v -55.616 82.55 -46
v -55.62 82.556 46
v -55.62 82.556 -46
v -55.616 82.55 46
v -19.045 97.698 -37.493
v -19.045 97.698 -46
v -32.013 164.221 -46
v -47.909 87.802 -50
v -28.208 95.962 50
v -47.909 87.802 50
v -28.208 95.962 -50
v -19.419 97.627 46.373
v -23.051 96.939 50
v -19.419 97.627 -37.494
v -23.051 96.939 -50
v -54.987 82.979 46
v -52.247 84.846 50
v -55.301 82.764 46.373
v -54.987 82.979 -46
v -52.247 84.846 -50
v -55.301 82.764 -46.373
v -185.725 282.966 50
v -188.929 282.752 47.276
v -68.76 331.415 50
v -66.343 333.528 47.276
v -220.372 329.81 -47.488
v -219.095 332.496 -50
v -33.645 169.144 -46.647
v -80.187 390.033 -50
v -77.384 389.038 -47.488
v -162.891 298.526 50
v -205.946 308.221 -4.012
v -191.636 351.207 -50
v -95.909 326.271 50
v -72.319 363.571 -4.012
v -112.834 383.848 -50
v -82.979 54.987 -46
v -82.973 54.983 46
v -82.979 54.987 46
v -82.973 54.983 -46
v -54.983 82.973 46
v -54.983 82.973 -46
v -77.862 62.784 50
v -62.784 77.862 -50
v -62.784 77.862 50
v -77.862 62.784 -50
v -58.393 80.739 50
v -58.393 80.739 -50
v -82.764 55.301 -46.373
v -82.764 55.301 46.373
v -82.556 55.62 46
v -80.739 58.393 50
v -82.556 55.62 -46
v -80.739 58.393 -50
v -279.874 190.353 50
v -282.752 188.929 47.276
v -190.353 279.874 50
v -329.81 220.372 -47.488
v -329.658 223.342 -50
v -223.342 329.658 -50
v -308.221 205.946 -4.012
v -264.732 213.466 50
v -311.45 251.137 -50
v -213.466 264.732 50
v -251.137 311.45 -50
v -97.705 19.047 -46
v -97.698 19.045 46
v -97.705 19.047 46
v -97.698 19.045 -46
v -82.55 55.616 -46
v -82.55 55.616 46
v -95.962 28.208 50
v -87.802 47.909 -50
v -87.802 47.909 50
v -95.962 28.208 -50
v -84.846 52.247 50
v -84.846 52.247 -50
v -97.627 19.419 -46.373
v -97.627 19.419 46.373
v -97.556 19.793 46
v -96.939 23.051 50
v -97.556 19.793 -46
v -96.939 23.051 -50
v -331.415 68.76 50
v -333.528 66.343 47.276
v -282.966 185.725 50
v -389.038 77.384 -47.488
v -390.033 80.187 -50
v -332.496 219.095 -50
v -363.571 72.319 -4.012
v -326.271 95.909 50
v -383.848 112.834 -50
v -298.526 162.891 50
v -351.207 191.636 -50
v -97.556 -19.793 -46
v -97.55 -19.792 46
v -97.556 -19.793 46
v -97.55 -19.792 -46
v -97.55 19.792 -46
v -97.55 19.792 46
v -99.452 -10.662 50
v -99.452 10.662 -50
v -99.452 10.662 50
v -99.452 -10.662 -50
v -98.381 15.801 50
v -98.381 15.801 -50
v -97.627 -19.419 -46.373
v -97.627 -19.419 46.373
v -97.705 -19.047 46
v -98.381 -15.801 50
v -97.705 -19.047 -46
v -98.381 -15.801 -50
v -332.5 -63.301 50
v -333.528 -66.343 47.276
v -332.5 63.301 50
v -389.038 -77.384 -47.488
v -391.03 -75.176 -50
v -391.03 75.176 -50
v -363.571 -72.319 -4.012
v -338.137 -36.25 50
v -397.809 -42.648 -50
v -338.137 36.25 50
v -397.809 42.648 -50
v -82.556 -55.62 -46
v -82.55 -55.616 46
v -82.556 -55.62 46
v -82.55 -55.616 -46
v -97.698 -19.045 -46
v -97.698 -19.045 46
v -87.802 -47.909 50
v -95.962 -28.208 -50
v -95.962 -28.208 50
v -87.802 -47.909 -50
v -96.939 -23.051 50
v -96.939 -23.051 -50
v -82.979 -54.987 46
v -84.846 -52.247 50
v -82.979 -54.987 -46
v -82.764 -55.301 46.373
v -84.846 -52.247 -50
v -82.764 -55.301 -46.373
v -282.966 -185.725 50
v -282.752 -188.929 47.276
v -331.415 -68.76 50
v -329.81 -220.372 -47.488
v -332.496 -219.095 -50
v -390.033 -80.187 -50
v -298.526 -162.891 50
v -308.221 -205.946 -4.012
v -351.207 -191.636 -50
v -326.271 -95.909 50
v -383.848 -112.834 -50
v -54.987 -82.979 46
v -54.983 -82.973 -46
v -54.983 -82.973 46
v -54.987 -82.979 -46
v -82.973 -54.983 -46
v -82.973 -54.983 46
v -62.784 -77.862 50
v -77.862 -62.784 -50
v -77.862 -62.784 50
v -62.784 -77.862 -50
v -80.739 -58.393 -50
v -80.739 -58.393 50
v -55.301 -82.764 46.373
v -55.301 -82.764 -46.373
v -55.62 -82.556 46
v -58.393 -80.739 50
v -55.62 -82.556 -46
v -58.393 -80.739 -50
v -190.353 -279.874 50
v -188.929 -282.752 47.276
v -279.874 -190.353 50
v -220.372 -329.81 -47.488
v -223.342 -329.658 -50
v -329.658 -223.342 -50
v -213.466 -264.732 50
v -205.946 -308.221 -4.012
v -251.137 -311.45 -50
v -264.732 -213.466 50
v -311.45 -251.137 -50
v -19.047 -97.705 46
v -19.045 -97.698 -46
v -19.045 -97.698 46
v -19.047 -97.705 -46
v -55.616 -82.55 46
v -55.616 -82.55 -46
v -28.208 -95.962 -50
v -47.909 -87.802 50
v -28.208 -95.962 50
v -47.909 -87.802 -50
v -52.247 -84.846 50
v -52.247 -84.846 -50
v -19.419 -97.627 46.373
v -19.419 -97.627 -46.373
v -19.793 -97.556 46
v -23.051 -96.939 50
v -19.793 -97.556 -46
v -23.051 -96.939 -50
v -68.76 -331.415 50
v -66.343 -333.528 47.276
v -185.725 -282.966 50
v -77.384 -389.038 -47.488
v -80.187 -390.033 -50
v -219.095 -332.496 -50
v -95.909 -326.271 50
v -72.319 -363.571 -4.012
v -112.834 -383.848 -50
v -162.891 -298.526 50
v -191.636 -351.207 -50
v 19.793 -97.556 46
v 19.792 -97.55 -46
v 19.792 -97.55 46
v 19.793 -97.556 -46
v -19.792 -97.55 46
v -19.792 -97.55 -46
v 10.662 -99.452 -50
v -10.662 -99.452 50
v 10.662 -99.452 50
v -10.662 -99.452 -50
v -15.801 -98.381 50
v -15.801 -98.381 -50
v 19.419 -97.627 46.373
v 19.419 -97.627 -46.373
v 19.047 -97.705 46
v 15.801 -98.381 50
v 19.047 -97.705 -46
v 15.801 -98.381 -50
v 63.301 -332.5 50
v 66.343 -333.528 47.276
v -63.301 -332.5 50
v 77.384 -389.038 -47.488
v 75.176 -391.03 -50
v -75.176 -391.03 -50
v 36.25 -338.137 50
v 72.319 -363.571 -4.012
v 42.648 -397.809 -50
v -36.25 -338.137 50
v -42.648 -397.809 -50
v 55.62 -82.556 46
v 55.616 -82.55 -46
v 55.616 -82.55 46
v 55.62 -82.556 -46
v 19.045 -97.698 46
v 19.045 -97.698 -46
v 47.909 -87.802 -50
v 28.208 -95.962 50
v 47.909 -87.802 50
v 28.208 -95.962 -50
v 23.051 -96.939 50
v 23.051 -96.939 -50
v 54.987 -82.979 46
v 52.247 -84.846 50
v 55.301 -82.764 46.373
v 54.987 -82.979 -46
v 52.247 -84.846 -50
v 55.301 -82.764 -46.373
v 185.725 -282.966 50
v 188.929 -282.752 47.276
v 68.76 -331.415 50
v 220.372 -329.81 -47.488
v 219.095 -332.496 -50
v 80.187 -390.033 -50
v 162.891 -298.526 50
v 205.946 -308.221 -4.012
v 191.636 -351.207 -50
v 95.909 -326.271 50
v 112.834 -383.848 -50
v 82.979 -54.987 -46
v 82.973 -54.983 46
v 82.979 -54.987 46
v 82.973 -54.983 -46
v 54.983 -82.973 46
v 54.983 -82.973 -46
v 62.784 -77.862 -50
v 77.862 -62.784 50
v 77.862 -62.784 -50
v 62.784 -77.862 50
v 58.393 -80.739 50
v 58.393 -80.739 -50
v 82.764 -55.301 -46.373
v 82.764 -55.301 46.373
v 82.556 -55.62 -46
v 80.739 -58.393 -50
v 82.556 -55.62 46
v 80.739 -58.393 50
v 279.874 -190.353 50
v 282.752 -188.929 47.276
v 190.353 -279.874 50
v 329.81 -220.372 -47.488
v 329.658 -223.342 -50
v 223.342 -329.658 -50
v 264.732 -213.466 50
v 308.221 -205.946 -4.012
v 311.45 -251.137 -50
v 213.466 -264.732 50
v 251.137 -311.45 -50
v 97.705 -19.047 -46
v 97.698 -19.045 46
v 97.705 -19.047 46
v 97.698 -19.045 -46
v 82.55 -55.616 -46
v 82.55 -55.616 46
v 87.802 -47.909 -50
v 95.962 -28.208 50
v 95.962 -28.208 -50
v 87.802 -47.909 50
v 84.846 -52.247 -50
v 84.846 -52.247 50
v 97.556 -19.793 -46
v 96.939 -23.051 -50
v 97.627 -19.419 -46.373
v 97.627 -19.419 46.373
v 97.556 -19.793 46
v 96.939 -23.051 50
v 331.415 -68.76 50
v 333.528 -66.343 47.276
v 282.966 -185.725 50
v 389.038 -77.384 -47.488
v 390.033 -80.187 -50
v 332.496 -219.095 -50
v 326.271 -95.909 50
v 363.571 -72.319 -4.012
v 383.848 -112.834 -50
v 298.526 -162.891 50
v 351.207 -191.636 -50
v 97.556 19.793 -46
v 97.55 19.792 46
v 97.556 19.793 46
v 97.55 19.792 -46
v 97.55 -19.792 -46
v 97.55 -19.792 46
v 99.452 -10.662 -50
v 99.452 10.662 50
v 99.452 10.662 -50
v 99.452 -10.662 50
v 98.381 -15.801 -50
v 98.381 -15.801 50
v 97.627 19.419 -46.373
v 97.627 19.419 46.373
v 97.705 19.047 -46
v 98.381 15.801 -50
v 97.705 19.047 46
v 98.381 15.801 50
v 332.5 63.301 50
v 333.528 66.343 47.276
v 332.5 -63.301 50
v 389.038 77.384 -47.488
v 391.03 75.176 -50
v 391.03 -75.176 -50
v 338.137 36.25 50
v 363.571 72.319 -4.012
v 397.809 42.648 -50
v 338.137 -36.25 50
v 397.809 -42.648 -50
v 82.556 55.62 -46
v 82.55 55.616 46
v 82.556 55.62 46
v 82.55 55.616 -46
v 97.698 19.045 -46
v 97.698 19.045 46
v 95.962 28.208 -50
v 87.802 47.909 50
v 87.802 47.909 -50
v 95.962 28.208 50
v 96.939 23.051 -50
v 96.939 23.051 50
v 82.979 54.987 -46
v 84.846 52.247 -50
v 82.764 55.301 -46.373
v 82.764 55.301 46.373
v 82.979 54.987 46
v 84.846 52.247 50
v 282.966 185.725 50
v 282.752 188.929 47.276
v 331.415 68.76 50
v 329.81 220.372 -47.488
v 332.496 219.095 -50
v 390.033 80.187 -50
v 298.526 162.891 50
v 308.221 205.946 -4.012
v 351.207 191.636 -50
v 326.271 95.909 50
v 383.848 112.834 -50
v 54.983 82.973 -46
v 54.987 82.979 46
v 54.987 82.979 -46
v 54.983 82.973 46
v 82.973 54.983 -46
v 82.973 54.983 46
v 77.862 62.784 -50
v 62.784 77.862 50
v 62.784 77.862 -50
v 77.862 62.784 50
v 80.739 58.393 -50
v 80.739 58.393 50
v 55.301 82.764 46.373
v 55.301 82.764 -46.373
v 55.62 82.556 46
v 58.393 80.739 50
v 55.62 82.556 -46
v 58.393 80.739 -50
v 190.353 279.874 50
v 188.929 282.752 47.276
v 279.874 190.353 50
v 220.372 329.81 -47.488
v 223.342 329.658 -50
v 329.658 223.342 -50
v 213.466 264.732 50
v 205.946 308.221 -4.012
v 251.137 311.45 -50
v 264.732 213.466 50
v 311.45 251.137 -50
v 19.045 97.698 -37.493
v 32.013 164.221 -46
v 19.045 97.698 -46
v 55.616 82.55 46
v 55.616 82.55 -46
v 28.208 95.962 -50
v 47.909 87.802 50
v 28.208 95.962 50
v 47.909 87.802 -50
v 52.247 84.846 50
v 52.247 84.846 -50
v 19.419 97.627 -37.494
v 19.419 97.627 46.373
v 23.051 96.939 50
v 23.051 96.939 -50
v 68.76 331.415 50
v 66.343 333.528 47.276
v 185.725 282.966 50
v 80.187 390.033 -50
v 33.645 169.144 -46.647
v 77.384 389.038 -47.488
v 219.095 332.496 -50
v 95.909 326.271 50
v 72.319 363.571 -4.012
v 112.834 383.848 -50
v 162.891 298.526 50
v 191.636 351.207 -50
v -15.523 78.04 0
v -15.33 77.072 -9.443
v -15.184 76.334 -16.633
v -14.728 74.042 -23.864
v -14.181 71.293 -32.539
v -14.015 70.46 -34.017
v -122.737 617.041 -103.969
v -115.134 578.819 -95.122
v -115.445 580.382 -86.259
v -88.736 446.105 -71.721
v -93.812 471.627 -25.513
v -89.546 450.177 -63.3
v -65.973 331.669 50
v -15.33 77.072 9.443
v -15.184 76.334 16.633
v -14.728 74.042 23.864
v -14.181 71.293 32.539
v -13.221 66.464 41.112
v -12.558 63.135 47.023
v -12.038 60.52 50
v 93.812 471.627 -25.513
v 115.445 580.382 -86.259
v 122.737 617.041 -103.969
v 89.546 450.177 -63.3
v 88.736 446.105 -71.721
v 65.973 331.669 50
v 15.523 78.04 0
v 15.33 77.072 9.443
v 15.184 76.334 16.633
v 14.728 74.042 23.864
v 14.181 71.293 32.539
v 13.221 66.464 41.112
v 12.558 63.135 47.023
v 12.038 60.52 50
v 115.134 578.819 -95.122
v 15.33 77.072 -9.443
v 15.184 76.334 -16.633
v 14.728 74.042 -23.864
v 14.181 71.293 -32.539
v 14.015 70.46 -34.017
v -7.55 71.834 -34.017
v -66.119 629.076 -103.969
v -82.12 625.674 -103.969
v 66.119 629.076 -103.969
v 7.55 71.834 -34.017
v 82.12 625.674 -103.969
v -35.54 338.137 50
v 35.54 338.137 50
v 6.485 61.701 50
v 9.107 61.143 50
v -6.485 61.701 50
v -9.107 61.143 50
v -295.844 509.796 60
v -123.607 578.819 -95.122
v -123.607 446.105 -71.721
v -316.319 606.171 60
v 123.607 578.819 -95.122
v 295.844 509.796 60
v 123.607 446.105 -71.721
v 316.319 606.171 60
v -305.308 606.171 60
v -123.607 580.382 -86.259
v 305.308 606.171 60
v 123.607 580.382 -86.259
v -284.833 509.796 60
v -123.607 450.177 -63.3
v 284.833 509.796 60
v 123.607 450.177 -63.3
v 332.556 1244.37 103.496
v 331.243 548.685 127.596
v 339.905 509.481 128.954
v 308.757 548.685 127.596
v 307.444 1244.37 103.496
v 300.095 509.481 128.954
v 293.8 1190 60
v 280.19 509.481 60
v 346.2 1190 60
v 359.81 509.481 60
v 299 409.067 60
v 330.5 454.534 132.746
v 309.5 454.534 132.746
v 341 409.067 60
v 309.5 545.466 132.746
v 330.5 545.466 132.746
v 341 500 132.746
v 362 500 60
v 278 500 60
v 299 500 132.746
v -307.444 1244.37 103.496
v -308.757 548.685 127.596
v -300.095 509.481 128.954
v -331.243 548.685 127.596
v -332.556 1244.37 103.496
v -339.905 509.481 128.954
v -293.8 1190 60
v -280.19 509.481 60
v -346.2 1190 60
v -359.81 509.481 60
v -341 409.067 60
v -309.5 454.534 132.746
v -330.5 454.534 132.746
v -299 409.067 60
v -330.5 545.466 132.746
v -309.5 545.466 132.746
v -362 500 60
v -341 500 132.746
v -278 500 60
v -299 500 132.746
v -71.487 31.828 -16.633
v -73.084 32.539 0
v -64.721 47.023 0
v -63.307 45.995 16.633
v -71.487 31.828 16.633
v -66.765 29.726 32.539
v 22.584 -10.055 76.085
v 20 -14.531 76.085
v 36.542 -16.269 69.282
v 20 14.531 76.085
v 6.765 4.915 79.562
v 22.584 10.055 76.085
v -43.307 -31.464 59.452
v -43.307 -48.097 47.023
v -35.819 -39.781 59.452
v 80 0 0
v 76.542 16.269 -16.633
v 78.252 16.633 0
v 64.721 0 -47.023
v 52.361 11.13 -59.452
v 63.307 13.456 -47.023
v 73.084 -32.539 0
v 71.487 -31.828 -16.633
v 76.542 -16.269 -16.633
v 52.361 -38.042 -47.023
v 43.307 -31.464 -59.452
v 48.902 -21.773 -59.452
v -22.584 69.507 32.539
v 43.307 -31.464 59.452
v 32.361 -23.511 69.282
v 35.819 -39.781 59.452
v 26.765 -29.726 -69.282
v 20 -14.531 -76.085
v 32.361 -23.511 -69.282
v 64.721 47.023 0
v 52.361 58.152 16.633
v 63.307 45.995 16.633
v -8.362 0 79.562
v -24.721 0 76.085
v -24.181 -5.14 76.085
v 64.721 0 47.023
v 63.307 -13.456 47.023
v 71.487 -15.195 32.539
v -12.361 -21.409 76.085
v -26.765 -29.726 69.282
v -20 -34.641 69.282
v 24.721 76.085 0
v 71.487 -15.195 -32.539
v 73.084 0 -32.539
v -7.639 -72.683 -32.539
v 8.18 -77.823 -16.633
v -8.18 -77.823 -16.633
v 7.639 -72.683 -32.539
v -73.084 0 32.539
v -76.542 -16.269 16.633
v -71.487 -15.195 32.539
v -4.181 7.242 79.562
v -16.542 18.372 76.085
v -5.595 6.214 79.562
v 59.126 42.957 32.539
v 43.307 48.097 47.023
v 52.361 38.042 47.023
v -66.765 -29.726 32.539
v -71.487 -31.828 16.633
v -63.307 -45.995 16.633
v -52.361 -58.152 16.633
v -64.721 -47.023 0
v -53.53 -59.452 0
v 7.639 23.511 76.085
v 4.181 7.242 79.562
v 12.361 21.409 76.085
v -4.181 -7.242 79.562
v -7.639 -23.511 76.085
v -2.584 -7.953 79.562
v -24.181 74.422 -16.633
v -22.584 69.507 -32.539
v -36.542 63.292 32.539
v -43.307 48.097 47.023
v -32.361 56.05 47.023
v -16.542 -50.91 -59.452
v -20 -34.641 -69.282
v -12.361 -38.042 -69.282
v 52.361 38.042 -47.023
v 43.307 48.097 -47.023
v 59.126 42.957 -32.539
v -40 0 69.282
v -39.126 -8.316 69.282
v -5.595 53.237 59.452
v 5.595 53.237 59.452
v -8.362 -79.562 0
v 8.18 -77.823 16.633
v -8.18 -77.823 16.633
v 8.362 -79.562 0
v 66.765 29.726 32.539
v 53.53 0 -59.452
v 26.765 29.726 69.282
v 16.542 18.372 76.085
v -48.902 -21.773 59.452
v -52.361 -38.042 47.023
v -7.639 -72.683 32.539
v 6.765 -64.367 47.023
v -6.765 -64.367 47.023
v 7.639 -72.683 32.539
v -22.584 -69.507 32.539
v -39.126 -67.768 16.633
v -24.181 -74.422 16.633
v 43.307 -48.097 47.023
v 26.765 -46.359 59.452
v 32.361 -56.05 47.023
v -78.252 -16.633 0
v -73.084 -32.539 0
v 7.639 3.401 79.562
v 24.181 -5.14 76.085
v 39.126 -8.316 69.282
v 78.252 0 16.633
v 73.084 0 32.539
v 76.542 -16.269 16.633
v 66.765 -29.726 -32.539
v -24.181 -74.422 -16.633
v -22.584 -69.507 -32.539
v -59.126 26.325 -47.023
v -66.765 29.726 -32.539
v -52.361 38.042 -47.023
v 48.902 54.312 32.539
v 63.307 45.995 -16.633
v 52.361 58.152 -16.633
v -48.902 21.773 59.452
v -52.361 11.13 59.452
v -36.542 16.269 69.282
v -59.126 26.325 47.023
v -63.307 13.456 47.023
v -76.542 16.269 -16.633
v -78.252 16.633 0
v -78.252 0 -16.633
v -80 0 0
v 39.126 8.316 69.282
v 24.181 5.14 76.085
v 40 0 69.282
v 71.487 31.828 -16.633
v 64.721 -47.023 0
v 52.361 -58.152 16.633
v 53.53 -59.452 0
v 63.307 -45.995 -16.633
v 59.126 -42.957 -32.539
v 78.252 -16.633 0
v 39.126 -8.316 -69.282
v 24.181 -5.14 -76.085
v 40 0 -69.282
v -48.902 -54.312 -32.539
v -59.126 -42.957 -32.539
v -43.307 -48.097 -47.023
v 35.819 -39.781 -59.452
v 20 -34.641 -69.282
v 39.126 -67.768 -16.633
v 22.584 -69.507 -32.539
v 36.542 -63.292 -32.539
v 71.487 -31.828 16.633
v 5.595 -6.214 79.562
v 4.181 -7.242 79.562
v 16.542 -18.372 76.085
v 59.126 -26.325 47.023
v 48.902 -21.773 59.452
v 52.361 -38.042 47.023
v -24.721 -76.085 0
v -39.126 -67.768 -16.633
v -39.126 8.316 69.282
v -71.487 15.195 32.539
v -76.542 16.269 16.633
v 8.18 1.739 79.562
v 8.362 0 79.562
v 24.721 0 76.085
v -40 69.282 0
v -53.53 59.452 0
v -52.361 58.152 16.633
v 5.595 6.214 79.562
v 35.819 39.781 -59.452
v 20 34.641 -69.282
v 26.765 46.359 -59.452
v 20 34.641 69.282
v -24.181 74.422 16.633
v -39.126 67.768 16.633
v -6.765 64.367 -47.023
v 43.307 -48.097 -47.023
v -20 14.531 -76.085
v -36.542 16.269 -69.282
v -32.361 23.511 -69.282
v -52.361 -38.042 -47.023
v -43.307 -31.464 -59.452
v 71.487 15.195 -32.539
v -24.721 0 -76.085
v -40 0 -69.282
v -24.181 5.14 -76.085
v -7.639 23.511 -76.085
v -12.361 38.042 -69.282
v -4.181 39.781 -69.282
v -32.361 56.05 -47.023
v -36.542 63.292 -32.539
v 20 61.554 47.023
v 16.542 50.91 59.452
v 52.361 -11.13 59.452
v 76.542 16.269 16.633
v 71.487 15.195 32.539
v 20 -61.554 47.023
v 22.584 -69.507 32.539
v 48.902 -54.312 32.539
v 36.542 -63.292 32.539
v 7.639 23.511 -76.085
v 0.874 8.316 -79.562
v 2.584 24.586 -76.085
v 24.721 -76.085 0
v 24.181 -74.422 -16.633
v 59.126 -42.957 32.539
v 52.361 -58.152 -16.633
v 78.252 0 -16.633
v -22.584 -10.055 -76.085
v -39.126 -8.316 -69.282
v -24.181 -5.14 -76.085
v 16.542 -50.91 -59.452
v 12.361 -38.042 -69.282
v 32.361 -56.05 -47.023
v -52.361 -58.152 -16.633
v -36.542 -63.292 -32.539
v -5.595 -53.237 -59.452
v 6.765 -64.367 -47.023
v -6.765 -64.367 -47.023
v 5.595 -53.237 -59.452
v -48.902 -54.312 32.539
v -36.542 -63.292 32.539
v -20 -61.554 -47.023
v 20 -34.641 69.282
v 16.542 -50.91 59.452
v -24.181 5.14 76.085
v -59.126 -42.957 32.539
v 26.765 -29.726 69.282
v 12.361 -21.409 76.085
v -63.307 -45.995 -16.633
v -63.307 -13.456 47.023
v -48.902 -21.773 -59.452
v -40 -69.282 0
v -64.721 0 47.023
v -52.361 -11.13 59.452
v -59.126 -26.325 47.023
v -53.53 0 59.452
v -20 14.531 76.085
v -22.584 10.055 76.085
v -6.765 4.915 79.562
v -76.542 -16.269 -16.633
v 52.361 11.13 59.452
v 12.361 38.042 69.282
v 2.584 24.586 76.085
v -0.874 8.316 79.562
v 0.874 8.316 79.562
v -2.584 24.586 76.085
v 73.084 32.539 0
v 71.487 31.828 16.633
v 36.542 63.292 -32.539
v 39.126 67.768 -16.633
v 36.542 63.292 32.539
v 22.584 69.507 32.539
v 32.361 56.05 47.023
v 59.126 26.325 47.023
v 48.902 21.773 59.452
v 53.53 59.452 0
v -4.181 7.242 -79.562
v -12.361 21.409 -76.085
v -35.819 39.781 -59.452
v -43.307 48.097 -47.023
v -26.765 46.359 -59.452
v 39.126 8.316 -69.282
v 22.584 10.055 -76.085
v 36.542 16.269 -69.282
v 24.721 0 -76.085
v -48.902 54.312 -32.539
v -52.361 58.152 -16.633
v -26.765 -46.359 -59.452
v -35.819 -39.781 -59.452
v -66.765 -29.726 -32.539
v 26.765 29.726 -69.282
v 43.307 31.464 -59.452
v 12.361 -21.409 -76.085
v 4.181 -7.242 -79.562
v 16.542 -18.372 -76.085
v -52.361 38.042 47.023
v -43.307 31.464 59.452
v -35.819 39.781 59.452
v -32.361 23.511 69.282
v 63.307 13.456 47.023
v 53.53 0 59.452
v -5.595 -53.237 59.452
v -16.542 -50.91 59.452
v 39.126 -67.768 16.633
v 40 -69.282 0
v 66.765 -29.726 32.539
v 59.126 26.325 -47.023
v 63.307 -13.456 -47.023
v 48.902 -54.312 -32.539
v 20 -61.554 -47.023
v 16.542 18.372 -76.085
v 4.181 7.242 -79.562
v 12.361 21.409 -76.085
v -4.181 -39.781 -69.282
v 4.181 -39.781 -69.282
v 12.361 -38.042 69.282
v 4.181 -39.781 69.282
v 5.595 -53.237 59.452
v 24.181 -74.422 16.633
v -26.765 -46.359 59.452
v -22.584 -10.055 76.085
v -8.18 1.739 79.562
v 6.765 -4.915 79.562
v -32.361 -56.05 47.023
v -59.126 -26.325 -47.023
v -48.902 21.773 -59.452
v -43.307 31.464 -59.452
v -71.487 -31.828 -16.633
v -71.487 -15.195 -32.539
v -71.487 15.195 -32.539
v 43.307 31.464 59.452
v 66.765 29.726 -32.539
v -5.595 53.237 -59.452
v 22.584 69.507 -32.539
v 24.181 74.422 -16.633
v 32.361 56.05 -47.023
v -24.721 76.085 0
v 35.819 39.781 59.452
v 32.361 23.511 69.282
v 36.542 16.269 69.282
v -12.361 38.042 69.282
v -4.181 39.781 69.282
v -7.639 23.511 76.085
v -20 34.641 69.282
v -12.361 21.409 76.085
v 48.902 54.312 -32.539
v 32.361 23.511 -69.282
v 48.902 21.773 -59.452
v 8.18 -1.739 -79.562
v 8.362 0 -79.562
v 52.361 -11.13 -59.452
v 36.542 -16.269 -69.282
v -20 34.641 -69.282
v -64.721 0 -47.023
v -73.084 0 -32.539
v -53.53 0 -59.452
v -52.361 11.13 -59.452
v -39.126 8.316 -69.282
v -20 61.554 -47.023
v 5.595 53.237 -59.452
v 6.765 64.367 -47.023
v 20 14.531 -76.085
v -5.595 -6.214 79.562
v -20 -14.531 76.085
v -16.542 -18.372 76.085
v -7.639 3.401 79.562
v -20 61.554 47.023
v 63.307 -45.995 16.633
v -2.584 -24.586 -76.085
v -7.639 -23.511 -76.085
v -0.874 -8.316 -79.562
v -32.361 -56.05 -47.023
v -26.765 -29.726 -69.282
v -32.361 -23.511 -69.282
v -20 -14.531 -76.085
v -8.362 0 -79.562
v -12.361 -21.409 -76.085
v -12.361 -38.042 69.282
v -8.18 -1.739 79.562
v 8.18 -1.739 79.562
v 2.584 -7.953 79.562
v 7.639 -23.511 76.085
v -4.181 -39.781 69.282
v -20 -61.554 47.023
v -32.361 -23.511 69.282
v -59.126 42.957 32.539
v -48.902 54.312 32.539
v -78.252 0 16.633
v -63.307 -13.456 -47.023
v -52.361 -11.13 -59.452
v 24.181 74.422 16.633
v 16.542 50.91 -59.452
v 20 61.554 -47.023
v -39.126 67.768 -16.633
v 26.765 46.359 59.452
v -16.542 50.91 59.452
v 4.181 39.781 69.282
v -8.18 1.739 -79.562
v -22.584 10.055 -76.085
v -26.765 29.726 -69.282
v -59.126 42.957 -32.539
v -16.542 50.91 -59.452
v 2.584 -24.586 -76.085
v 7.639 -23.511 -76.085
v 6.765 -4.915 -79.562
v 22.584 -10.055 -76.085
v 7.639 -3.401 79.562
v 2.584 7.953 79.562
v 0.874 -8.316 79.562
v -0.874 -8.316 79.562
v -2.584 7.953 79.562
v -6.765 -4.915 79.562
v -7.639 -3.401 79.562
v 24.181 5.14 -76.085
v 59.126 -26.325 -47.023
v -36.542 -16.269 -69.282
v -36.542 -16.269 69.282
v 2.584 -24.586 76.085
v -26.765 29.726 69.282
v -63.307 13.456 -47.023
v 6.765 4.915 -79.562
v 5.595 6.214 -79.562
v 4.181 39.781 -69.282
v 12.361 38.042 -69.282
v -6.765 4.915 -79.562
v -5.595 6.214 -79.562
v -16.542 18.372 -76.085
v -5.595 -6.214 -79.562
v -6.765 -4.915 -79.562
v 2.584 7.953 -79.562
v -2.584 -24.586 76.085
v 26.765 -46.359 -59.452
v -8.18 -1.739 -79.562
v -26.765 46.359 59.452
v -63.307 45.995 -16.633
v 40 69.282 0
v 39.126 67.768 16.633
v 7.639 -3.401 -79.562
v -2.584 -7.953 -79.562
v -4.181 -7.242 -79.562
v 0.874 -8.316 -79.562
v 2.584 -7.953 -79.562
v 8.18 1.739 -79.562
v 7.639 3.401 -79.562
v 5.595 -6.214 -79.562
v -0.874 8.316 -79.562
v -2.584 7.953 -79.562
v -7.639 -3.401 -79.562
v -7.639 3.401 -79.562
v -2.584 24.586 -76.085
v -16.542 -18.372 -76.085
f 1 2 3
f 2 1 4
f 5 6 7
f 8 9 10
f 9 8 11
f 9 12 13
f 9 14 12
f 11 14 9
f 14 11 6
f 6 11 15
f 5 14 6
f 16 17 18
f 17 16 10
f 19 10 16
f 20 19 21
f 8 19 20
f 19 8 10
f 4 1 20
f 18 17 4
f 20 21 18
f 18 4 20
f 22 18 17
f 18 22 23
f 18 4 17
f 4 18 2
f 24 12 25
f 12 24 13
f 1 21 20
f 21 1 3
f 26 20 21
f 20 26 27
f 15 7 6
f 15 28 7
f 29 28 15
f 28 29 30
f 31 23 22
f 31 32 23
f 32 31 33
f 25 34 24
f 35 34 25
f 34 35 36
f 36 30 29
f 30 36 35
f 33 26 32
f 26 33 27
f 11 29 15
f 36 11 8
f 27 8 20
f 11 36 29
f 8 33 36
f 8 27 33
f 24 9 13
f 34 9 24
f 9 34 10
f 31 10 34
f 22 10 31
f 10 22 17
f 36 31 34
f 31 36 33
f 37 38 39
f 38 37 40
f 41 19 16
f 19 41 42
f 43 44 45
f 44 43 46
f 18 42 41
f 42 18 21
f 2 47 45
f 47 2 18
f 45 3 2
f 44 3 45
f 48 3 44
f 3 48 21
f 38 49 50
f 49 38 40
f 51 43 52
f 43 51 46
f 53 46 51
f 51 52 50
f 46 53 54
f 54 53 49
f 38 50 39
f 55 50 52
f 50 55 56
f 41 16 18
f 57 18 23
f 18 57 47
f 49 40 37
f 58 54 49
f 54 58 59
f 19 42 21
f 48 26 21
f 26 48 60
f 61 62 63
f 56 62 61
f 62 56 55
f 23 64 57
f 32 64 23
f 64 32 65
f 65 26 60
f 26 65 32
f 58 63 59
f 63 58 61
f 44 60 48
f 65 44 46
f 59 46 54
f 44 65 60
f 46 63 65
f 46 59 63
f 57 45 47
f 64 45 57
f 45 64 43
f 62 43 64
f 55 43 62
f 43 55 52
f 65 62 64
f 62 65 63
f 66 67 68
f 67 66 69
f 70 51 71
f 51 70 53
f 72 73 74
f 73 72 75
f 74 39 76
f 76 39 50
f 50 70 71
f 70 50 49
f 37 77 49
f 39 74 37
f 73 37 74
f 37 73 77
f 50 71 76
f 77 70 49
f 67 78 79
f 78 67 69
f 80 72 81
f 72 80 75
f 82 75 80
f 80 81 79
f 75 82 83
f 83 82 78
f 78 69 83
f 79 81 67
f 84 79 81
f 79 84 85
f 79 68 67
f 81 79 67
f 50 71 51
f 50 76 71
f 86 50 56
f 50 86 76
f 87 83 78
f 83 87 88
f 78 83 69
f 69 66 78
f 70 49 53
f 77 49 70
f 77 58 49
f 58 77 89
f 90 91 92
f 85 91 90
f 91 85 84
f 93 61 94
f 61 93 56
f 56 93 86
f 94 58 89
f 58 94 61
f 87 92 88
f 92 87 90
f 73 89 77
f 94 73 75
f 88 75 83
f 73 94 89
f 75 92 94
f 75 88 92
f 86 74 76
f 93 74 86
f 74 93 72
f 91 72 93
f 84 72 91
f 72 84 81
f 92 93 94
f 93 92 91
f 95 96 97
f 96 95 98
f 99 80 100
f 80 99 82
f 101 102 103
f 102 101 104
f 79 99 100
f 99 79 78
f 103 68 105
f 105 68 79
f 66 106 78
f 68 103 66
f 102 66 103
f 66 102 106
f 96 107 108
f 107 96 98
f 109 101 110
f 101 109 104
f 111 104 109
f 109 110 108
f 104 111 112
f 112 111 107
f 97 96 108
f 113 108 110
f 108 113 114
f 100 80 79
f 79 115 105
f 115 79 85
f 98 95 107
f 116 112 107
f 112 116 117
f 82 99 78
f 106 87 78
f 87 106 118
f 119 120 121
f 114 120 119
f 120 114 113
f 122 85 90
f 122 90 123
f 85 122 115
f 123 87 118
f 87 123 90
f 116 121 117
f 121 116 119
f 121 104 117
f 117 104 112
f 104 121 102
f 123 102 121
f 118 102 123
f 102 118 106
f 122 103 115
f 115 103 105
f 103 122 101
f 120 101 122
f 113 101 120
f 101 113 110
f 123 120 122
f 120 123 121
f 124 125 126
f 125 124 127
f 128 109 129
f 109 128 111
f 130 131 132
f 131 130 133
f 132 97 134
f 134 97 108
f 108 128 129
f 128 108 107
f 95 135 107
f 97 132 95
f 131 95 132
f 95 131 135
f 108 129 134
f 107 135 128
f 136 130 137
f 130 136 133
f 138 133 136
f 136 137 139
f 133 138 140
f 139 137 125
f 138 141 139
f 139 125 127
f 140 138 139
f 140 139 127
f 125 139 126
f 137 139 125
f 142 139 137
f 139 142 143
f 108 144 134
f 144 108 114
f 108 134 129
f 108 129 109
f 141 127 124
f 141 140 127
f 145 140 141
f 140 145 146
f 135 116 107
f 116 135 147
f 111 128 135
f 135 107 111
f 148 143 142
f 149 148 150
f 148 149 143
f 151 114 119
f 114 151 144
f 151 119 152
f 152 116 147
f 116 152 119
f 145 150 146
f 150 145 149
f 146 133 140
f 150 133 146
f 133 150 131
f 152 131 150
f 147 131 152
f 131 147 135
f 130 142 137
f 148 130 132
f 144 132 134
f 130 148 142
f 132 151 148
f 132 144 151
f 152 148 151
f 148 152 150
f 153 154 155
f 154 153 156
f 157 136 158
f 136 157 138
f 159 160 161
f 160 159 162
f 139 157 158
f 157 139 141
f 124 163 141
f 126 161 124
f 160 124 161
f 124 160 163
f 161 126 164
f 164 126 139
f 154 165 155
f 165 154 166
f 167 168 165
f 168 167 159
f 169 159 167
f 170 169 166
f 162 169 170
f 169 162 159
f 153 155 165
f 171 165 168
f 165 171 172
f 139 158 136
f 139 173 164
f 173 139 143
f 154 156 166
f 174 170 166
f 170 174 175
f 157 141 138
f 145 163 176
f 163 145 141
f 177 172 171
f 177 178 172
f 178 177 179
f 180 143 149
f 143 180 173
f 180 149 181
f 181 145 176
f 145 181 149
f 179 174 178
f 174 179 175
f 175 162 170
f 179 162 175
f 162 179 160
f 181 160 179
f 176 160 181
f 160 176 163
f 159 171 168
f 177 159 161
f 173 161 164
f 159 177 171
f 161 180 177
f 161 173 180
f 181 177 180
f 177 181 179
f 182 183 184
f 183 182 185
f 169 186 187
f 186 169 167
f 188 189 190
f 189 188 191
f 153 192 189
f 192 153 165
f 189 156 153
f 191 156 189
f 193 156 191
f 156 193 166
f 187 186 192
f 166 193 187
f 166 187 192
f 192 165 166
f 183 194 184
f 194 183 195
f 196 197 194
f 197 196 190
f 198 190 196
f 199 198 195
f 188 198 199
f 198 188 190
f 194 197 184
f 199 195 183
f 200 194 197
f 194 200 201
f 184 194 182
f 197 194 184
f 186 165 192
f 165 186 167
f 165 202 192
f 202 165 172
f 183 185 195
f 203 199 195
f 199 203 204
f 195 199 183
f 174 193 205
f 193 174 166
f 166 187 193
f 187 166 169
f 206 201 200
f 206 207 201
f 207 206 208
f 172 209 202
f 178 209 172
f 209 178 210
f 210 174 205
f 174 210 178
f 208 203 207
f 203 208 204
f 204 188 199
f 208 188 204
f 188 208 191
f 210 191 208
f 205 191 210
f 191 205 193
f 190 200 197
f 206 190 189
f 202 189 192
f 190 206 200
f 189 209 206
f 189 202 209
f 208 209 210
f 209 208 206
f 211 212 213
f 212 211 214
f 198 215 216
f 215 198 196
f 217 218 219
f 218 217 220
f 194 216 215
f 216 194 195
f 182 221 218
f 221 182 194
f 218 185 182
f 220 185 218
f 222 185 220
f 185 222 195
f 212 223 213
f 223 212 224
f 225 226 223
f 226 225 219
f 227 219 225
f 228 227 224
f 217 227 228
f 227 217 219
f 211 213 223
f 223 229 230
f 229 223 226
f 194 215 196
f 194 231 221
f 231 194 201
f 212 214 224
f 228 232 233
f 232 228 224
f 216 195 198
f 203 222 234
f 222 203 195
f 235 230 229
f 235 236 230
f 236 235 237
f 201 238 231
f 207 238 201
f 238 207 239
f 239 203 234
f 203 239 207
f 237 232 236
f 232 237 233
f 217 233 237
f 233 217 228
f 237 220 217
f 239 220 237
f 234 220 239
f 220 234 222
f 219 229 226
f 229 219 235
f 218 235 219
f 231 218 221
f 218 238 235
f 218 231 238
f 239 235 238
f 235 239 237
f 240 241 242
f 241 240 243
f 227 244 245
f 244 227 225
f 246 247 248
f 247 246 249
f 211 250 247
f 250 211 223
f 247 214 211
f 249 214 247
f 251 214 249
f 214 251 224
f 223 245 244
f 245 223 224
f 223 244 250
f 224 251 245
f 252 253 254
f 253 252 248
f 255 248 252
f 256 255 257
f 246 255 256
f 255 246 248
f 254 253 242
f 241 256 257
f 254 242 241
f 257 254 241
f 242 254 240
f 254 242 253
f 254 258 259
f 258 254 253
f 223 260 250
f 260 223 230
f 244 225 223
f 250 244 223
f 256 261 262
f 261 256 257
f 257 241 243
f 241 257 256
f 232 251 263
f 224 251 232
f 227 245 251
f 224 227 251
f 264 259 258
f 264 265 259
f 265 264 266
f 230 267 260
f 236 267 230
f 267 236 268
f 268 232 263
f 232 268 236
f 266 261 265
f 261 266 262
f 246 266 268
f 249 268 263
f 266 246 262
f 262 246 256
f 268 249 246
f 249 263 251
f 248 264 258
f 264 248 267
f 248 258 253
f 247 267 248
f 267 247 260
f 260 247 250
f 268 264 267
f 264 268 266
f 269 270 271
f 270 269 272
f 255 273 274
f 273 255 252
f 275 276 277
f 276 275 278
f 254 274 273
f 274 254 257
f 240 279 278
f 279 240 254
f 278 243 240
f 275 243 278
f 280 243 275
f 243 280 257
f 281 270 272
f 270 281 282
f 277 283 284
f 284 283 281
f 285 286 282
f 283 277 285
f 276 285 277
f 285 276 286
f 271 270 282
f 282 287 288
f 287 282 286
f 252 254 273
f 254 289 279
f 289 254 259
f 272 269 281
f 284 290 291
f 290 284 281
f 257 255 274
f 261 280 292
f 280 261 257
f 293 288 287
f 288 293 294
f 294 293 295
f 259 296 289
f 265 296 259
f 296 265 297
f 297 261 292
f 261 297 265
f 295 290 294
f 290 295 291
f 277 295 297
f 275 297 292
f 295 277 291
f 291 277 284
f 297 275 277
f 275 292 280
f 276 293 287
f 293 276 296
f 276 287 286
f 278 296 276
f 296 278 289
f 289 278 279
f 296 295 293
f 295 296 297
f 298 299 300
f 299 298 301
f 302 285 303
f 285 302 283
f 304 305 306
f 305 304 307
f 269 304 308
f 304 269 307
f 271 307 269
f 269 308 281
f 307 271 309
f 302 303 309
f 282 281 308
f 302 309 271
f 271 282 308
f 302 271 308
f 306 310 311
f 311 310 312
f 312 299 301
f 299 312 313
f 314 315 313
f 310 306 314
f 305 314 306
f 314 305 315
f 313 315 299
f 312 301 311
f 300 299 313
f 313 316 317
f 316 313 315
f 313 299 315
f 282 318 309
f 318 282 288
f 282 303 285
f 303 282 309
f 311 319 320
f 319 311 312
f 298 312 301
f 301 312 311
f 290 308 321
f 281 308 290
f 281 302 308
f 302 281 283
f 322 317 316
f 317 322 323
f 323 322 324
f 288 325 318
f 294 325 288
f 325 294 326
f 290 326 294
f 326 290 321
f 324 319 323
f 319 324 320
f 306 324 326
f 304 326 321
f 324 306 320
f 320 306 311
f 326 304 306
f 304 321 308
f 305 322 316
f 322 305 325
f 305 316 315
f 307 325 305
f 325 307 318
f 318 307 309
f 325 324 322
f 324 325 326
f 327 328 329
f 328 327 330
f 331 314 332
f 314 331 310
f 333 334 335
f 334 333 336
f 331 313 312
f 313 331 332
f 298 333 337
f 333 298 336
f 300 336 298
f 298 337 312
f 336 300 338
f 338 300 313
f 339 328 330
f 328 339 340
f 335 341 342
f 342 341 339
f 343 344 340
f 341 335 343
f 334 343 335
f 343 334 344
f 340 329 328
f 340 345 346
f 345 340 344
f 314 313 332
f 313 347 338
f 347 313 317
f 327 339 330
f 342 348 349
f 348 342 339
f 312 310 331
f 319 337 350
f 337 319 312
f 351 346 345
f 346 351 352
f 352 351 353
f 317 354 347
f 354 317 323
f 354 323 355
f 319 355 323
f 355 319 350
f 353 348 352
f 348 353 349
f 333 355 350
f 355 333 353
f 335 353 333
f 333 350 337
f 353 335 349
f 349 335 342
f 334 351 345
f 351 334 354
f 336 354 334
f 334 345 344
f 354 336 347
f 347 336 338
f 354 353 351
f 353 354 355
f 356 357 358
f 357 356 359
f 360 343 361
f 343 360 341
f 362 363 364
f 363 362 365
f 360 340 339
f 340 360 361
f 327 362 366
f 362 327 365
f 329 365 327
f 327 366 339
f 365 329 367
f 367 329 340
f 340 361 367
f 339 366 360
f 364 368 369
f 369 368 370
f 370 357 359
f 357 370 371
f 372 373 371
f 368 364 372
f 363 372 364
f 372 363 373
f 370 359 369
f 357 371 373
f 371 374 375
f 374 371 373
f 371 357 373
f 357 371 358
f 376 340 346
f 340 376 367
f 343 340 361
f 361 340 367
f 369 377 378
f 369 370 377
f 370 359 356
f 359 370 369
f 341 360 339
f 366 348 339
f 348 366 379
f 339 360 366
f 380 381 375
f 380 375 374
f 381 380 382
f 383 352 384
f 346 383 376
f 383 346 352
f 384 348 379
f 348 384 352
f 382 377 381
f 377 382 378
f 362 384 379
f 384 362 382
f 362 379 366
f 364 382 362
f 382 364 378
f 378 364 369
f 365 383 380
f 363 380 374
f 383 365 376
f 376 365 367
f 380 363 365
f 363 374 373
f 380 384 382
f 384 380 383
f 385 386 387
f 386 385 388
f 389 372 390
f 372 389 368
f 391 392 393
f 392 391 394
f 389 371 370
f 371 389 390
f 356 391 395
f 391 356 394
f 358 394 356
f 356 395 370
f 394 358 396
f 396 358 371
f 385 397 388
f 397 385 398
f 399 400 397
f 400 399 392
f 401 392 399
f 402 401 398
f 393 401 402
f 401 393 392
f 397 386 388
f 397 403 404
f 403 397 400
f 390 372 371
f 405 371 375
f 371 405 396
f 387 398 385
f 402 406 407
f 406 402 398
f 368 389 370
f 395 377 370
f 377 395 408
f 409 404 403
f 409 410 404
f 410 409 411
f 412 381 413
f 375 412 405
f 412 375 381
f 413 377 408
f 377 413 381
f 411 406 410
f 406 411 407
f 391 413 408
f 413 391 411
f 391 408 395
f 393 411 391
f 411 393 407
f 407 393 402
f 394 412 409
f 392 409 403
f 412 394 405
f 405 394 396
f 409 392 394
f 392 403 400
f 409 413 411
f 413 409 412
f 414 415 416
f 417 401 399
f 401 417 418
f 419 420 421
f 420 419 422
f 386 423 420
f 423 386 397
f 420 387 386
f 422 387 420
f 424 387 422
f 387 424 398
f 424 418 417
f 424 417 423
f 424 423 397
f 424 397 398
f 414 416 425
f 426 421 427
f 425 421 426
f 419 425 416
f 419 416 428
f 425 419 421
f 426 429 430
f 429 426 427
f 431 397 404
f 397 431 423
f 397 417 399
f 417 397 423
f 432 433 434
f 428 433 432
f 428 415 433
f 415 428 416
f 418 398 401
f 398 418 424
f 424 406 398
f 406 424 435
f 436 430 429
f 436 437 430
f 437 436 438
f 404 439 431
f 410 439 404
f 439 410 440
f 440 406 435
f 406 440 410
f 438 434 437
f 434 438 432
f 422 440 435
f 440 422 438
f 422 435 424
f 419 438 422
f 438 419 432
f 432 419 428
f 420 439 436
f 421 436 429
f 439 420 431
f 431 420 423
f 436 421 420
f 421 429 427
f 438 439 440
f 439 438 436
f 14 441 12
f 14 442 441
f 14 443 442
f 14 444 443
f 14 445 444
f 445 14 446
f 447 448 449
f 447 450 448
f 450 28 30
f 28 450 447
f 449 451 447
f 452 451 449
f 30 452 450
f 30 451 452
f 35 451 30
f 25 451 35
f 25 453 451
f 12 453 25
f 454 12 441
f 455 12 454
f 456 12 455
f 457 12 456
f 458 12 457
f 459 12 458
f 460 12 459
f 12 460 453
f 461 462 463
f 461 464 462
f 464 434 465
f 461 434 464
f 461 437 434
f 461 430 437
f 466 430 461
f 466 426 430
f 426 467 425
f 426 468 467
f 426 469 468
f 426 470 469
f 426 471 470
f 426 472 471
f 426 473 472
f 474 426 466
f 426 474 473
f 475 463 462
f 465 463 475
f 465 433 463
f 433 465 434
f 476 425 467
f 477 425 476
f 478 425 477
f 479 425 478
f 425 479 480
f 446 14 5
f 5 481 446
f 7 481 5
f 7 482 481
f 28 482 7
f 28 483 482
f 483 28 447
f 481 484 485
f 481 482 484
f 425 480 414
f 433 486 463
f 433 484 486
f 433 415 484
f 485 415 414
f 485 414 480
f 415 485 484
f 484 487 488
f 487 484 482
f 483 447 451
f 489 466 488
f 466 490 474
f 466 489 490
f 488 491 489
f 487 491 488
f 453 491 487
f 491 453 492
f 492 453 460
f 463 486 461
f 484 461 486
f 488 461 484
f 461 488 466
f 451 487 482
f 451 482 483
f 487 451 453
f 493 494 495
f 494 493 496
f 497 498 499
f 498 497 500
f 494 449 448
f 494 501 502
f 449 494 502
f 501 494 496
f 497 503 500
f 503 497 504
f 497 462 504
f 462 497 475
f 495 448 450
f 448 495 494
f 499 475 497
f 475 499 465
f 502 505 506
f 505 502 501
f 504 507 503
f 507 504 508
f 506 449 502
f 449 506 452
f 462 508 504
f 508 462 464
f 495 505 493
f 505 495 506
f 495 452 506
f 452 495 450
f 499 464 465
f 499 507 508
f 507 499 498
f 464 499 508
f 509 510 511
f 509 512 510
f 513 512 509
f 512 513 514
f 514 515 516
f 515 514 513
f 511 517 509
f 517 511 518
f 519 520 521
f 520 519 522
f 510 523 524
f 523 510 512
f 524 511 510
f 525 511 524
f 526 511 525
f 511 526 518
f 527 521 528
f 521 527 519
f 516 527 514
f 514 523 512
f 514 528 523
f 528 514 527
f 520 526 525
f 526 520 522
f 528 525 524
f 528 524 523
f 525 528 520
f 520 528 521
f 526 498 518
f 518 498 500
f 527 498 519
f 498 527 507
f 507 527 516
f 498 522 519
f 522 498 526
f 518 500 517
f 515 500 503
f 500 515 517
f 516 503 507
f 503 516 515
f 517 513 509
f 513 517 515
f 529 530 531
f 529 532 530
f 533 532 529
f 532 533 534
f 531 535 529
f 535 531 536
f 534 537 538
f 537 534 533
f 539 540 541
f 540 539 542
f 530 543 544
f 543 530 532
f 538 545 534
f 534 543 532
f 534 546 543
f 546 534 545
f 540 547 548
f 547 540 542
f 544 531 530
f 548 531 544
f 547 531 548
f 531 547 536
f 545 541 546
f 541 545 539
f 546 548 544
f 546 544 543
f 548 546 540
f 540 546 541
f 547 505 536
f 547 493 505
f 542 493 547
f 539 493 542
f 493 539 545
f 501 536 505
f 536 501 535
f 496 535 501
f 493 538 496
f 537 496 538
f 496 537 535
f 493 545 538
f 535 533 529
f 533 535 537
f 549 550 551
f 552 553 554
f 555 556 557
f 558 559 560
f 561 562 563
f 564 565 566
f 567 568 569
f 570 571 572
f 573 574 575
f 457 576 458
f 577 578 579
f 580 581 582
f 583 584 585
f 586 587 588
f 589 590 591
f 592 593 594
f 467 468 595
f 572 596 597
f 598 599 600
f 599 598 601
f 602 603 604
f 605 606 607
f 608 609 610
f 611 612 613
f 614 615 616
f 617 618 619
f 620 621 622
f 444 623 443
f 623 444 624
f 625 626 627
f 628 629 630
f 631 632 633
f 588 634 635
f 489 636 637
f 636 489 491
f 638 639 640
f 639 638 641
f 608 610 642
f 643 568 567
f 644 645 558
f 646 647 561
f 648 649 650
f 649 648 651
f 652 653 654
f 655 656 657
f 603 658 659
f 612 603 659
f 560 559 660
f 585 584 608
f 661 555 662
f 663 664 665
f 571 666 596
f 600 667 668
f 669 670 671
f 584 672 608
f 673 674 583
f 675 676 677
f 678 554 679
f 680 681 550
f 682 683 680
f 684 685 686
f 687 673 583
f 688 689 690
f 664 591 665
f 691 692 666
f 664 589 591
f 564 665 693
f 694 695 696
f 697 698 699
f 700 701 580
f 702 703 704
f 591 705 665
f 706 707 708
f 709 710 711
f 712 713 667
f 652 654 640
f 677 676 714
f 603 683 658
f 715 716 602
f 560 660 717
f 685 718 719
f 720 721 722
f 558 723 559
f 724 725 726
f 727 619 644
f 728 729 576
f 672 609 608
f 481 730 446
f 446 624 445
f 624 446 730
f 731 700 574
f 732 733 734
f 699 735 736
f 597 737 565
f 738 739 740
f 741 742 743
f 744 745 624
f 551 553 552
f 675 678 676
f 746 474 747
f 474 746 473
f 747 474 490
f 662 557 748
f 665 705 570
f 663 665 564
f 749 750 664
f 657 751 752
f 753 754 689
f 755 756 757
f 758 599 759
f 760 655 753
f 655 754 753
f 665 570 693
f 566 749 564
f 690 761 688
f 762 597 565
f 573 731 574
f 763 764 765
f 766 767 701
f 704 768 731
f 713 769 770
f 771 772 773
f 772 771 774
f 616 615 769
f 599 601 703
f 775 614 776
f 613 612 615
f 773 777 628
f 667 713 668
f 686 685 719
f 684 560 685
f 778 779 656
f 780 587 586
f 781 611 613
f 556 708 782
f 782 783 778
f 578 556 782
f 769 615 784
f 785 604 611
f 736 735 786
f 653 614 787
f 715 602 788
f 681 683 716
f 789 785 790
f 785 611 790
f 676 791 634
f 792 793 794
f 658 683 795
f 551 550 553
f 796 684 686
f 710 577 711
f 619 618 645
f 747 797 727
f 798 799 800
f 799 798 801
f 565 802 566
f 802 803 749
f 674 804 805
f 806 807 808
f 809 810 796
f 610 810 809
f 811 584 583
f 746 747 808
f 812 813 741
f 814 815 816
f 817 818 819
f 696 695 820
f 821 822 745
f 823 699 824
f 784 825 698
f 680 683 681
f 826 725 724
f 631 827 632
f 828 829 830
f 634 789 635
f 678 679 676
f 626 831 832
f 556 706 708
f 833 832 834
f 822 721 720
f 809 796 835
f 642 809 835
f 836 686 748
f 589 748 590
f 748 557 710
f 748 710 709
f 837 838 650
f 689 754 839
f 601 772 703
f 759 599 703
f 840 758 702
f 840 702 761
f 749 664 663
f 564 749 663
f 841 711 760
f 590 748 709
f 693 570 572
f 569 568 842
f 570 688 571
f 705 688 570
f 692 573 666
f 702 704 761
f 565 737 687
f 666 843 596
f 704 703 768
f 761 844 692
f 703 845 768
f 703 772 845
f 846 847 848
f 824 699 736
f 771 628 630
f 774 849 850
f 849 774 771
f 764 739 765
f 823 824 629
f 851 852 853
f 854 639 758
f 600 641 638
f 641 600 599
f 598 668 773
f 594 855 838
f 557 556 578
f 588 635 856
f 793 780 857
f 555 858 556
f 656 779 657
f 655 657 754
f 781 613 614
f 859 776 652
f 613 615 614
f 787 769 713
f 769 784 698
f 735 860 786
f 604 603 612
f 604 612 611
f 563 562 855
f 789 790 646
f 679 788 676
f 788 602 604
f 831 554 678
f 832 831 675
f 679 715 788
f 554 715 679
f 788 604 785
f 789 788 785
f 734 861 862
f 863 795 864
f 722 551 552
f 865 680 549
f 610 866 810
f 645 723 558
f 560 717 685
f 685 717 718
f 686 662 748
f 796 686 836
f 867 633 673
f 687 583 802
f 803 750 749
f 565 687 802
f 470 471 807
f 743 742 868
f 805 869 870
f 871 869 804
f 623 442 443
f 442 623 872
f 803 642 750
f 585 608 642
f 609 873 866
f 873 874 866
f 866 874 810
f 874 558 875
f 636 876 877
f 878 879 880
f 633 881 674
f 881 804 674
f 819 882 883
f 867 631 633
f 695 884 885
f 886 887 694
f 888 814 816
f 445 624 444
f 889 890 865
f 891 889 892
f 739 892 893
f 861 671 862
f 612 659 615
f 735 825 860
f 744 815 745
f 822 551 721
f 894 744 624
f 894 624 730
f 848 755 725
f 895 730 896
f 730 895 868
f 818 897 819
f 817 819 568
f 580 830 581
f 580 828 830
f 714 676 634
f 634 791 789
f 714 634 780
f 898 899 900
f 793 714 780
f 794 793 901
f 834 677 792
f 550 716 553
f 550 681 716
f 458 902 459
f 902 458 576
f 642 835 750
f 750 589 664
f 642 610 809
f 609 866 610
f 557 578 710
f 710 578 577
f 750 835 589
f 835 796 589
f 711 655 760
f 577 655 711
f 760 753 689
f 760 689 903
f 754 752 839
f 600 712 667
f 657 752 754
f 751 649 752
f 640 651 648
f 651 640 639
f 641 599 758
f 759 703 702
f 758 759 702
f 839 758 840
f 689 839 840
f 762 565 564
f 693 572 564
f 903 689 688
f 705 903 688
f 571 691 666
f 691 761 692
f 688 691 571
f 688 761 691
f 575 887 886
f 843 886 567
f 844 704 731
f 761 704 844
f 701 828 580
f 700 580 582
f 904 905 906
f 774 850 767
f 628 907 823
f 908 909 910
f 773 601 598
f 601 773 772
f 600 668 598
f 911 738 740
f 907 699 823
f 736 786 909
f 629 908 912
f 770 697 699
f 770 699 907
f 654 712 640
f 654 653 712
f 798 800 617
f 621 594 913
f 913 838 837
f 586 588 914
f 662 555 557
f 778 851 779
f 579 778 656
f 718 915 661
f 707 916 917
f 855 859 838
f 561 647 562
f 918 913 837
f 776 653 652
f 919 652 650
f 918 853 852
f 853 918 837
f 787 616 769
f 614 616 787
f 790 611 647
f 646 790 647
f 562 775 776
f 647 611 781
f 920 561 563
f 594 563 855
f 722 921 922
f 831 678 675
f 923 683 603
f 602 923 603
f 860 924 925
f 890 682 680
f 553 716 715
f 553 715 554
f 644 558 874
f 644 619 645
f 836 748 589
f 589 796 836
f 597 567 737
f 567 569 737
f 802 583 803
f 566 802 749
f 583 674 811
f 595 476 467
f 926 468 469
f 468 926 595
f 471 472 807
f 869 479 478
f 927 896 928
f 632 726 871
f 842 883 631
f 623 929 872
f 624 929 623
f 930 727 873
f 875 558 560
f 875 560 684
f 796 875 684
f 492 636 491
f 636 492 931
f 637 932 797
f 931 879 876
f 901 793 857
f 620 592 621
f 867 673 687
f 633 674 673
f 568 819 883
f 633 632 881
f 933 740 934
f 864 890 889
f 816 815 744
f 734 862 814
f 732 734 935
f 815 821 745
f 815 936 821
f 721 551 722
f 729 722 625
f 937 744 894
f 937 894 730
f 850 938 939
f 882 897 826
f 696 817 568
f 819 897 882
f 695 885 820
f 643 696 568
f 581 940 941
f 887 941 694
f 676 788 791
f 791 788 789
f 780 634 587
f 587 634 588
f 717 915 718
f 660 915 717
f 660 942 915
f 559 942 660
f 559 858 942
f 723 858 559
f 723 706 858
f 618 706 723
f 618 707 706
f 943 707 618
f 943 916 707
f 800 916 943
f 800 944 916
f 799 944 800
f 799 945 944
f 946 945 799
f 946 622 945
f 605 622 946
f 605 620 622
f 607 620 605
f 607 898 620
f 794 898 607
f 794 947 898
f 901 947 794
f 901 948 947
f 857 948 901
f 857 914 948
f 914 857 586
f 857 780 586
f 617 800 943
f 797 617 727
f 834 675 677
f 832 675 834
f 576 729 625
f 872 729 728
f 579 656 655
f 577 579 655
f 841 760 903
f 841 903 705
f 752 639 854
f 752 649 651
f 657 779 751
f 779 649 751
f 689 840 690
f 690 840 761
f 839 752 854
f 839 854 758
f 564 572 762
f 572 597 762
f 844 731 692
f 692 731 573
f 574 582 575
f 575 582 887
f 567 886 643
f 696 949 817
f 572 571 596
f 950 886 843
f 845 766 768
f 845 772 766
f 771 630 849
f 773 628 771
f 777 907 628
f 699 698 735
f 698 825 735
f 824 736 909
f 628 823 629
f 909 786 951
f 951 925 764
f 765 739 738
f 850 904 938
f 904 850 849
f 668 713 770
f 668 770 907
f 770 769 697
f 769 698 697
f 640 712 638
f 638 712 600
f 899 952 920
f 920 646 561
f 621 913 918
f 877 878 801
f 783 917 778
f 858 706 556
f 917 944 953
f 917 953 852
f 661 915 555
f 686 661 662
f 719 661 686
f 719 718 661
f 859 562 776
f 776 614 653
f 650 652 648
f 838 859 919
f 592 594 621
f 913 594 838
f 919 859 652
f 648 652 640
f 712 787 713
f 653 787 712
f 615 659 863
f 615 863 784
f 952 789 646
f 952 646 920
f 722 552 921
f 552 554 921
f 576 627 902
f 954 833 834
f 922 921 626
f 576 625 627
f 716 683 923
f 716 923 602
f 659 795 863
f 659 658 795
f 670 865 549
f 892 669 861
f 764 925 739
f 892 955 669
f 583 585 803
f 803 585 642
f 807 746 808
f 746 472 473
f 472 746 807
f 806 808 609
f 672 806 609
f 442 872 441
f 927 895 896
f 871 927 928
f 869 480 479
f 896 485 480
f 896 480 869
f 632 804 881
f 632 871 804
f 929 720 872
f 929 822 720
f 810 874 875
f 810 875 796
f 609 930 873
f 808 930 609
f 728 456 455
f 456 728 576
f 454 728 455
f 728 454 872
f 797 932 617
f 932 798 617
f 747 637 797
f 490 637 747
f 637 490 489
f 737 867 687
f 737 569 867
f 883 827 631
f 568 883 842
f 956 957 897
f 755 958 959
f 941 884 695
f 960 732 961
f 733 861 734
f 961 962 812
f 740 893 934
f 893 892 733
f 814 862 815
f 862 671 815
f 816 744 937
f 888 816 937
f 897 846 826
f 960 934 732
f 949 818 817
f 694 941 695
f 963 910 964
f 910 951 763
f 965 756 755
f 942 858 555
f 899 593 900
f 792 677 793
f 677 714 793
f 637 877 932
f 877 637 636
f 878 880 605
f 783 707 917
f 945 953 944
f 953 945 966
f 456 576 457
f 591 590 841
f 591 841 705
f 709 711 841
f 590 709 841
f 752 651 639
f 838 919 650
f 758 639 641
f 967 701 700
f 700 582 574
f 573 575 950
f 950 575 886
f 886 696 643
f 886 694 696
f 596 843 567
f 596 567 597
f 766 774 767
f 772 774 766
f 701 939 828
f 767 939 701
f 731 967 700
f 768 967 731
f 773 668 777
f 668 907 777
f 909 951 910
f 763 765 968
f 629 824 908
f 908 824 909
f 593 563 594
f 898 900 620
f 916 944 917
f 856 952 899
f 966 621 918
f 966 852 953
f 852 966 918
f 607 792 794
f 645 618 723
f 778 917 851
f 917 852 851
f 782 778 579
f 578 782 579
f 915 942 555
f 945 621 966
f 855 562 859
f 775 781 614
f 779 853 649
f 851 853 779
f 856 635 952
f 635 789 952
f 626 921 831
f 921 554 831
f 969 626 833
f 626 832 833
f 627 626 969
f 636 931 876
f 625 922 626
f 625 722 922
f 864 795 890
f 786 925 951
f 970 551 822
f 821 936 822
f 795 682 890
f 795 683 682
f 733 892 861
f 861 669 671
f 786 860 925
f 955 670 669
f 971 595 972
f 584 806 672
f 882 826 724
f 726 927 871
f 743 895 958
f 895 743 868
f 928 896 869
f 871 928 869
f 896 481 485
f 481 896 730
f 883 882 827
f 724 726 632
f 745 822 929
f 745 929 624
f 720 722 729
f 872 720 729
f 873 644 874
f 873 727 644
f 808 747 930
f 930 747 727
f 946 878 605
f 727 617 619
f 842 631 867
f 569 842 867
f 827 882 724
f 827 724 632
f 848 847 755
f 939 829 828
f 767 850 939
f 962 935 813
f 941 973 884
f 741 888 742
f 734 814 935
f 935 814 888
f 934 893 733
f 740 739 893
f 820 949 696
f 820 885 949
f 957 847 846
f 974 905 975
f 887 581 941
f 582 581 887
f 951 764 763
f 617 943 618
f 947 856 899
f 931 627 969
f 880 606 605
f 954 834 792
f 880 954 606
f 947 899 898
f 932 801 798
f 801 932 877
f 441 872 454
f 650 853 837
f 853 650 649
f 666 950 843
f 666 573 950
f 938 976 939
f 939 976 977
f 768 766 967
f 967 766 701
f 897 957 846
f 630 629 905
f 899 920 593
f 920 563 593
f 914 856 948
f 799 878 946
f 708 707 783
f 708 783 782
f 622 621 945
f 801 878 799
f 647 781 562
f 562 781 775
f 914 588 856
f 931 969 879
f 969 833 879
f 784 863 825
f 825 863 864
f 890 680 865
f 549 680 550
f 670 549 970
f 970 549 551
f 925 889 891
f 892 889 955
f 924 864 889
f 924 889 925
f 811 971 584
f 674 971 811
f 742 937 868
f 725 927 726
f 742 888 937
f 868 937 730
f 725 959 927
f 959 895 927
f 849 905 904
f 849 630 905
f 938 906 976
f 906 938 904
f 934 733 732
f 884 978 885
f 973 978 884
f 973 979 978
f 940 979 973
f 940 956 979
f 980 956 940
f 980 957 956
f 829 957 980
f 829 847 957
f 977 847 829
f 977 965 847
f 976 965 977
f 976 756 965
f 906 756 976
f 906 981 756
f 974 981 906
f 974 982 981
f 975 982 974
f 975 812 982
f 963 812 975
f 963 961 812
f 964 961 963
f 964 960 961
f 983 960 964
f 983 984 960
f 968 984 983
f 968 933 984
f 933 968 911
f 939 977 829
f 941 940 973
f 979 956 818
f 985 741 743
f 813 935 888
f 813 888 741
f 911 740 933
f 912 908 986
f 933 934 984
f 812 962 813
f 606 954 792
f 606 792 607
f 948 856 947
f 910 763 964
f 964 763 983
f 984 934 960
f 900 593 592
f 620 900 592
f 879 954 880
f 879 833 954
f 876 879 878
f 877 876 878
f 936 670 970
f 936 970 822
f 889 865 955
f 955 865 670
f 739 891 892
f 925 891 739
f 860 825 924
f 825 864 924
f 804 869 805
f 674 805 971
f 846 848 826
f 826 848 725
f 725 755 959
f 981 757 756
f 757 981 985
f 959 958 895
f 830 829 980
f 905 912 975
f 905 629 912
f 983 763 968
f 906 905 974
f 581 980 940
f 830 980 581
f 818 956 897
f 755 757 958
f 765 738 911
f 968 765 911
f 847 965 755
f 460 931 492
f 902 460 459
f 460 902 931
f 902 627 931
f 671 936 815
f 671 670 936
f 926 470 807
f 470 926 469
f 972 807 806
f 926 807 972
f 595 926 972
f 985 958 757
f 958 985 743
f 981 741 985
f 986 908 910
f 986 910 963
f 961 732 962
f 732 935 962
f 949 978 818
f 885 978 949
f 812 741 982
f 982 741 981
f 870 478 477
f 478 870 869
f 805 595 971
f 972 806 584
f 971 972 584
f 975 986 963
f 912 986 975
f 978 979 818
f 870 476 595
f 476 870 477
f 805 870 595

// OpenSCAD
module ms_corner_bar(h, r, n) {
    translate([0,0,(h /2)])
		rotate([90,0,((360/n) /2)])
			cylinder(r, r/100, r/100, $fn = 4);
}


module ms_disk_subtract(h,r,n, core=false) {
    translate([0,0,-(r/2)]) union() {
        mirror([1,0,0])
            rotate([0,0,-((360/n)/2)])
                cube(2*r);

        rotate([0,0,-((360/n)/2)])
            cube(2*r);
        
        if (!core) {
            cylinder(h*4,r/4,r/4);
        }

        translate([-2*r,-2*r, 0])
            cube([r*4,r*2,r*2]);
    }
    
    if (!core) {
        rotate([0,0,180]) {
            ms_corner_bar(h,r,n); 
            mirror([1,0,0]) ms_corner_bar(h,r,n);
            mirror([0,0,1]) ms_corner_bar(h,r,n);
            mirror([0,0,1]) mirror([1,0,0]) ms_corner_bar(h,r,n);
        }
    }
    if (core) {
        translate([0,0,-h*1.25])
            cylinder(h,2*r+1,0);
        
        translate([0,0,-3.15*h])
            cylinder(2*h,2*r+1,2*r+1);
        
    }
    
}

module ms_disk_hangar(h,r,n) {
    difference() {
        translate([0,0,-(h/2)])
            cylinder(h,r,r*.85);

        ms_disk_subtract(h,r,n);
    }
}

module ms_disk_hangar_scale(h,r,n) {
    scale([1.02,1,1]) ms_disk_hangar(h,r,n);
}

module ms_disk_core(h,r,n) {
    difference() {
        translate([0,0,-1.5*h])
            cylinder(2*h, 1.8*r, 0.85*r);
        
        ms_disk_subtract(h,r,n, core=true);
    }
}

module ms_disk(h,r,n) {
    disk_segment_angle = 360/n;
    for(angle=[disk_segment_angle:disk_segment_angle:360-disk_segment_angle])
        rotate(angle)
            ms_disk_hangar_scale(h,r,n);
}


module ms_main(h,r,n) {
    ms_disk(h,r,n);
    ms_ball(h,r,n);
    ms_engg(h,r,n);
}

module ms_ball(h,r,n) {
    sphere_radius = min(1.5*h, r/5);
    sphere(sphere_radius);
}

module ms_engg(h,r,n) {
    ms_disk_core(h,r,n);
    ms_pylon(h,r,n);
    ms_nac_assembly(h,r,n);
    mirror([1,0,0]) ms_nac_assembly(h,r,n);
}


module ms_nac_assembly(h,r,n) {
    translate([r*.8,r*1.25,h*.6])
        ms_nacelle(h,r,n);
}

module ms_nacelle(h,r,n) {
    scale([.4,1,.8])
        difference() {
            union () {
                rotate([-90,0,0])
                    cylinder(2*r,h,h*.6, $fn=6);

                sphere(h*1.05, $fn=6);
            }

            translate([-2*r,-2*r,-4*r])
                cube(r*4);

            translate([-r/2,r*1.6,-h/2])
                rotate([-45,0,0])
                    cube (r);
    }
}

module mothership() {
    ms_main(100,400,16);
}

mothership();

module ms_pylon(h, r, n) {
    rad1 = h/2 + r*r/(8*h);

    translate([0,r*1.5,.25*h]) rotate([-10,0,0]) scale([1.6,1,1.8]) difference() {
        translate([0,0,rad1-.8*h])
            rotate([90,0,0])
                cylinder(2*h, rad1, rad1, $fn=10);

        translate([0,h/10,rad1-.75*h])
            rotate([90,0,0])
                cylinder(2.2*h, rad1, rad1, $fn=10);
            
        translate([-r,-2.75*r,-2*h])
            rotate([-27,0,0])
                cube(2*r);

        translate([-r,-r,h*.3])
            cube(2*r);
    }
}
